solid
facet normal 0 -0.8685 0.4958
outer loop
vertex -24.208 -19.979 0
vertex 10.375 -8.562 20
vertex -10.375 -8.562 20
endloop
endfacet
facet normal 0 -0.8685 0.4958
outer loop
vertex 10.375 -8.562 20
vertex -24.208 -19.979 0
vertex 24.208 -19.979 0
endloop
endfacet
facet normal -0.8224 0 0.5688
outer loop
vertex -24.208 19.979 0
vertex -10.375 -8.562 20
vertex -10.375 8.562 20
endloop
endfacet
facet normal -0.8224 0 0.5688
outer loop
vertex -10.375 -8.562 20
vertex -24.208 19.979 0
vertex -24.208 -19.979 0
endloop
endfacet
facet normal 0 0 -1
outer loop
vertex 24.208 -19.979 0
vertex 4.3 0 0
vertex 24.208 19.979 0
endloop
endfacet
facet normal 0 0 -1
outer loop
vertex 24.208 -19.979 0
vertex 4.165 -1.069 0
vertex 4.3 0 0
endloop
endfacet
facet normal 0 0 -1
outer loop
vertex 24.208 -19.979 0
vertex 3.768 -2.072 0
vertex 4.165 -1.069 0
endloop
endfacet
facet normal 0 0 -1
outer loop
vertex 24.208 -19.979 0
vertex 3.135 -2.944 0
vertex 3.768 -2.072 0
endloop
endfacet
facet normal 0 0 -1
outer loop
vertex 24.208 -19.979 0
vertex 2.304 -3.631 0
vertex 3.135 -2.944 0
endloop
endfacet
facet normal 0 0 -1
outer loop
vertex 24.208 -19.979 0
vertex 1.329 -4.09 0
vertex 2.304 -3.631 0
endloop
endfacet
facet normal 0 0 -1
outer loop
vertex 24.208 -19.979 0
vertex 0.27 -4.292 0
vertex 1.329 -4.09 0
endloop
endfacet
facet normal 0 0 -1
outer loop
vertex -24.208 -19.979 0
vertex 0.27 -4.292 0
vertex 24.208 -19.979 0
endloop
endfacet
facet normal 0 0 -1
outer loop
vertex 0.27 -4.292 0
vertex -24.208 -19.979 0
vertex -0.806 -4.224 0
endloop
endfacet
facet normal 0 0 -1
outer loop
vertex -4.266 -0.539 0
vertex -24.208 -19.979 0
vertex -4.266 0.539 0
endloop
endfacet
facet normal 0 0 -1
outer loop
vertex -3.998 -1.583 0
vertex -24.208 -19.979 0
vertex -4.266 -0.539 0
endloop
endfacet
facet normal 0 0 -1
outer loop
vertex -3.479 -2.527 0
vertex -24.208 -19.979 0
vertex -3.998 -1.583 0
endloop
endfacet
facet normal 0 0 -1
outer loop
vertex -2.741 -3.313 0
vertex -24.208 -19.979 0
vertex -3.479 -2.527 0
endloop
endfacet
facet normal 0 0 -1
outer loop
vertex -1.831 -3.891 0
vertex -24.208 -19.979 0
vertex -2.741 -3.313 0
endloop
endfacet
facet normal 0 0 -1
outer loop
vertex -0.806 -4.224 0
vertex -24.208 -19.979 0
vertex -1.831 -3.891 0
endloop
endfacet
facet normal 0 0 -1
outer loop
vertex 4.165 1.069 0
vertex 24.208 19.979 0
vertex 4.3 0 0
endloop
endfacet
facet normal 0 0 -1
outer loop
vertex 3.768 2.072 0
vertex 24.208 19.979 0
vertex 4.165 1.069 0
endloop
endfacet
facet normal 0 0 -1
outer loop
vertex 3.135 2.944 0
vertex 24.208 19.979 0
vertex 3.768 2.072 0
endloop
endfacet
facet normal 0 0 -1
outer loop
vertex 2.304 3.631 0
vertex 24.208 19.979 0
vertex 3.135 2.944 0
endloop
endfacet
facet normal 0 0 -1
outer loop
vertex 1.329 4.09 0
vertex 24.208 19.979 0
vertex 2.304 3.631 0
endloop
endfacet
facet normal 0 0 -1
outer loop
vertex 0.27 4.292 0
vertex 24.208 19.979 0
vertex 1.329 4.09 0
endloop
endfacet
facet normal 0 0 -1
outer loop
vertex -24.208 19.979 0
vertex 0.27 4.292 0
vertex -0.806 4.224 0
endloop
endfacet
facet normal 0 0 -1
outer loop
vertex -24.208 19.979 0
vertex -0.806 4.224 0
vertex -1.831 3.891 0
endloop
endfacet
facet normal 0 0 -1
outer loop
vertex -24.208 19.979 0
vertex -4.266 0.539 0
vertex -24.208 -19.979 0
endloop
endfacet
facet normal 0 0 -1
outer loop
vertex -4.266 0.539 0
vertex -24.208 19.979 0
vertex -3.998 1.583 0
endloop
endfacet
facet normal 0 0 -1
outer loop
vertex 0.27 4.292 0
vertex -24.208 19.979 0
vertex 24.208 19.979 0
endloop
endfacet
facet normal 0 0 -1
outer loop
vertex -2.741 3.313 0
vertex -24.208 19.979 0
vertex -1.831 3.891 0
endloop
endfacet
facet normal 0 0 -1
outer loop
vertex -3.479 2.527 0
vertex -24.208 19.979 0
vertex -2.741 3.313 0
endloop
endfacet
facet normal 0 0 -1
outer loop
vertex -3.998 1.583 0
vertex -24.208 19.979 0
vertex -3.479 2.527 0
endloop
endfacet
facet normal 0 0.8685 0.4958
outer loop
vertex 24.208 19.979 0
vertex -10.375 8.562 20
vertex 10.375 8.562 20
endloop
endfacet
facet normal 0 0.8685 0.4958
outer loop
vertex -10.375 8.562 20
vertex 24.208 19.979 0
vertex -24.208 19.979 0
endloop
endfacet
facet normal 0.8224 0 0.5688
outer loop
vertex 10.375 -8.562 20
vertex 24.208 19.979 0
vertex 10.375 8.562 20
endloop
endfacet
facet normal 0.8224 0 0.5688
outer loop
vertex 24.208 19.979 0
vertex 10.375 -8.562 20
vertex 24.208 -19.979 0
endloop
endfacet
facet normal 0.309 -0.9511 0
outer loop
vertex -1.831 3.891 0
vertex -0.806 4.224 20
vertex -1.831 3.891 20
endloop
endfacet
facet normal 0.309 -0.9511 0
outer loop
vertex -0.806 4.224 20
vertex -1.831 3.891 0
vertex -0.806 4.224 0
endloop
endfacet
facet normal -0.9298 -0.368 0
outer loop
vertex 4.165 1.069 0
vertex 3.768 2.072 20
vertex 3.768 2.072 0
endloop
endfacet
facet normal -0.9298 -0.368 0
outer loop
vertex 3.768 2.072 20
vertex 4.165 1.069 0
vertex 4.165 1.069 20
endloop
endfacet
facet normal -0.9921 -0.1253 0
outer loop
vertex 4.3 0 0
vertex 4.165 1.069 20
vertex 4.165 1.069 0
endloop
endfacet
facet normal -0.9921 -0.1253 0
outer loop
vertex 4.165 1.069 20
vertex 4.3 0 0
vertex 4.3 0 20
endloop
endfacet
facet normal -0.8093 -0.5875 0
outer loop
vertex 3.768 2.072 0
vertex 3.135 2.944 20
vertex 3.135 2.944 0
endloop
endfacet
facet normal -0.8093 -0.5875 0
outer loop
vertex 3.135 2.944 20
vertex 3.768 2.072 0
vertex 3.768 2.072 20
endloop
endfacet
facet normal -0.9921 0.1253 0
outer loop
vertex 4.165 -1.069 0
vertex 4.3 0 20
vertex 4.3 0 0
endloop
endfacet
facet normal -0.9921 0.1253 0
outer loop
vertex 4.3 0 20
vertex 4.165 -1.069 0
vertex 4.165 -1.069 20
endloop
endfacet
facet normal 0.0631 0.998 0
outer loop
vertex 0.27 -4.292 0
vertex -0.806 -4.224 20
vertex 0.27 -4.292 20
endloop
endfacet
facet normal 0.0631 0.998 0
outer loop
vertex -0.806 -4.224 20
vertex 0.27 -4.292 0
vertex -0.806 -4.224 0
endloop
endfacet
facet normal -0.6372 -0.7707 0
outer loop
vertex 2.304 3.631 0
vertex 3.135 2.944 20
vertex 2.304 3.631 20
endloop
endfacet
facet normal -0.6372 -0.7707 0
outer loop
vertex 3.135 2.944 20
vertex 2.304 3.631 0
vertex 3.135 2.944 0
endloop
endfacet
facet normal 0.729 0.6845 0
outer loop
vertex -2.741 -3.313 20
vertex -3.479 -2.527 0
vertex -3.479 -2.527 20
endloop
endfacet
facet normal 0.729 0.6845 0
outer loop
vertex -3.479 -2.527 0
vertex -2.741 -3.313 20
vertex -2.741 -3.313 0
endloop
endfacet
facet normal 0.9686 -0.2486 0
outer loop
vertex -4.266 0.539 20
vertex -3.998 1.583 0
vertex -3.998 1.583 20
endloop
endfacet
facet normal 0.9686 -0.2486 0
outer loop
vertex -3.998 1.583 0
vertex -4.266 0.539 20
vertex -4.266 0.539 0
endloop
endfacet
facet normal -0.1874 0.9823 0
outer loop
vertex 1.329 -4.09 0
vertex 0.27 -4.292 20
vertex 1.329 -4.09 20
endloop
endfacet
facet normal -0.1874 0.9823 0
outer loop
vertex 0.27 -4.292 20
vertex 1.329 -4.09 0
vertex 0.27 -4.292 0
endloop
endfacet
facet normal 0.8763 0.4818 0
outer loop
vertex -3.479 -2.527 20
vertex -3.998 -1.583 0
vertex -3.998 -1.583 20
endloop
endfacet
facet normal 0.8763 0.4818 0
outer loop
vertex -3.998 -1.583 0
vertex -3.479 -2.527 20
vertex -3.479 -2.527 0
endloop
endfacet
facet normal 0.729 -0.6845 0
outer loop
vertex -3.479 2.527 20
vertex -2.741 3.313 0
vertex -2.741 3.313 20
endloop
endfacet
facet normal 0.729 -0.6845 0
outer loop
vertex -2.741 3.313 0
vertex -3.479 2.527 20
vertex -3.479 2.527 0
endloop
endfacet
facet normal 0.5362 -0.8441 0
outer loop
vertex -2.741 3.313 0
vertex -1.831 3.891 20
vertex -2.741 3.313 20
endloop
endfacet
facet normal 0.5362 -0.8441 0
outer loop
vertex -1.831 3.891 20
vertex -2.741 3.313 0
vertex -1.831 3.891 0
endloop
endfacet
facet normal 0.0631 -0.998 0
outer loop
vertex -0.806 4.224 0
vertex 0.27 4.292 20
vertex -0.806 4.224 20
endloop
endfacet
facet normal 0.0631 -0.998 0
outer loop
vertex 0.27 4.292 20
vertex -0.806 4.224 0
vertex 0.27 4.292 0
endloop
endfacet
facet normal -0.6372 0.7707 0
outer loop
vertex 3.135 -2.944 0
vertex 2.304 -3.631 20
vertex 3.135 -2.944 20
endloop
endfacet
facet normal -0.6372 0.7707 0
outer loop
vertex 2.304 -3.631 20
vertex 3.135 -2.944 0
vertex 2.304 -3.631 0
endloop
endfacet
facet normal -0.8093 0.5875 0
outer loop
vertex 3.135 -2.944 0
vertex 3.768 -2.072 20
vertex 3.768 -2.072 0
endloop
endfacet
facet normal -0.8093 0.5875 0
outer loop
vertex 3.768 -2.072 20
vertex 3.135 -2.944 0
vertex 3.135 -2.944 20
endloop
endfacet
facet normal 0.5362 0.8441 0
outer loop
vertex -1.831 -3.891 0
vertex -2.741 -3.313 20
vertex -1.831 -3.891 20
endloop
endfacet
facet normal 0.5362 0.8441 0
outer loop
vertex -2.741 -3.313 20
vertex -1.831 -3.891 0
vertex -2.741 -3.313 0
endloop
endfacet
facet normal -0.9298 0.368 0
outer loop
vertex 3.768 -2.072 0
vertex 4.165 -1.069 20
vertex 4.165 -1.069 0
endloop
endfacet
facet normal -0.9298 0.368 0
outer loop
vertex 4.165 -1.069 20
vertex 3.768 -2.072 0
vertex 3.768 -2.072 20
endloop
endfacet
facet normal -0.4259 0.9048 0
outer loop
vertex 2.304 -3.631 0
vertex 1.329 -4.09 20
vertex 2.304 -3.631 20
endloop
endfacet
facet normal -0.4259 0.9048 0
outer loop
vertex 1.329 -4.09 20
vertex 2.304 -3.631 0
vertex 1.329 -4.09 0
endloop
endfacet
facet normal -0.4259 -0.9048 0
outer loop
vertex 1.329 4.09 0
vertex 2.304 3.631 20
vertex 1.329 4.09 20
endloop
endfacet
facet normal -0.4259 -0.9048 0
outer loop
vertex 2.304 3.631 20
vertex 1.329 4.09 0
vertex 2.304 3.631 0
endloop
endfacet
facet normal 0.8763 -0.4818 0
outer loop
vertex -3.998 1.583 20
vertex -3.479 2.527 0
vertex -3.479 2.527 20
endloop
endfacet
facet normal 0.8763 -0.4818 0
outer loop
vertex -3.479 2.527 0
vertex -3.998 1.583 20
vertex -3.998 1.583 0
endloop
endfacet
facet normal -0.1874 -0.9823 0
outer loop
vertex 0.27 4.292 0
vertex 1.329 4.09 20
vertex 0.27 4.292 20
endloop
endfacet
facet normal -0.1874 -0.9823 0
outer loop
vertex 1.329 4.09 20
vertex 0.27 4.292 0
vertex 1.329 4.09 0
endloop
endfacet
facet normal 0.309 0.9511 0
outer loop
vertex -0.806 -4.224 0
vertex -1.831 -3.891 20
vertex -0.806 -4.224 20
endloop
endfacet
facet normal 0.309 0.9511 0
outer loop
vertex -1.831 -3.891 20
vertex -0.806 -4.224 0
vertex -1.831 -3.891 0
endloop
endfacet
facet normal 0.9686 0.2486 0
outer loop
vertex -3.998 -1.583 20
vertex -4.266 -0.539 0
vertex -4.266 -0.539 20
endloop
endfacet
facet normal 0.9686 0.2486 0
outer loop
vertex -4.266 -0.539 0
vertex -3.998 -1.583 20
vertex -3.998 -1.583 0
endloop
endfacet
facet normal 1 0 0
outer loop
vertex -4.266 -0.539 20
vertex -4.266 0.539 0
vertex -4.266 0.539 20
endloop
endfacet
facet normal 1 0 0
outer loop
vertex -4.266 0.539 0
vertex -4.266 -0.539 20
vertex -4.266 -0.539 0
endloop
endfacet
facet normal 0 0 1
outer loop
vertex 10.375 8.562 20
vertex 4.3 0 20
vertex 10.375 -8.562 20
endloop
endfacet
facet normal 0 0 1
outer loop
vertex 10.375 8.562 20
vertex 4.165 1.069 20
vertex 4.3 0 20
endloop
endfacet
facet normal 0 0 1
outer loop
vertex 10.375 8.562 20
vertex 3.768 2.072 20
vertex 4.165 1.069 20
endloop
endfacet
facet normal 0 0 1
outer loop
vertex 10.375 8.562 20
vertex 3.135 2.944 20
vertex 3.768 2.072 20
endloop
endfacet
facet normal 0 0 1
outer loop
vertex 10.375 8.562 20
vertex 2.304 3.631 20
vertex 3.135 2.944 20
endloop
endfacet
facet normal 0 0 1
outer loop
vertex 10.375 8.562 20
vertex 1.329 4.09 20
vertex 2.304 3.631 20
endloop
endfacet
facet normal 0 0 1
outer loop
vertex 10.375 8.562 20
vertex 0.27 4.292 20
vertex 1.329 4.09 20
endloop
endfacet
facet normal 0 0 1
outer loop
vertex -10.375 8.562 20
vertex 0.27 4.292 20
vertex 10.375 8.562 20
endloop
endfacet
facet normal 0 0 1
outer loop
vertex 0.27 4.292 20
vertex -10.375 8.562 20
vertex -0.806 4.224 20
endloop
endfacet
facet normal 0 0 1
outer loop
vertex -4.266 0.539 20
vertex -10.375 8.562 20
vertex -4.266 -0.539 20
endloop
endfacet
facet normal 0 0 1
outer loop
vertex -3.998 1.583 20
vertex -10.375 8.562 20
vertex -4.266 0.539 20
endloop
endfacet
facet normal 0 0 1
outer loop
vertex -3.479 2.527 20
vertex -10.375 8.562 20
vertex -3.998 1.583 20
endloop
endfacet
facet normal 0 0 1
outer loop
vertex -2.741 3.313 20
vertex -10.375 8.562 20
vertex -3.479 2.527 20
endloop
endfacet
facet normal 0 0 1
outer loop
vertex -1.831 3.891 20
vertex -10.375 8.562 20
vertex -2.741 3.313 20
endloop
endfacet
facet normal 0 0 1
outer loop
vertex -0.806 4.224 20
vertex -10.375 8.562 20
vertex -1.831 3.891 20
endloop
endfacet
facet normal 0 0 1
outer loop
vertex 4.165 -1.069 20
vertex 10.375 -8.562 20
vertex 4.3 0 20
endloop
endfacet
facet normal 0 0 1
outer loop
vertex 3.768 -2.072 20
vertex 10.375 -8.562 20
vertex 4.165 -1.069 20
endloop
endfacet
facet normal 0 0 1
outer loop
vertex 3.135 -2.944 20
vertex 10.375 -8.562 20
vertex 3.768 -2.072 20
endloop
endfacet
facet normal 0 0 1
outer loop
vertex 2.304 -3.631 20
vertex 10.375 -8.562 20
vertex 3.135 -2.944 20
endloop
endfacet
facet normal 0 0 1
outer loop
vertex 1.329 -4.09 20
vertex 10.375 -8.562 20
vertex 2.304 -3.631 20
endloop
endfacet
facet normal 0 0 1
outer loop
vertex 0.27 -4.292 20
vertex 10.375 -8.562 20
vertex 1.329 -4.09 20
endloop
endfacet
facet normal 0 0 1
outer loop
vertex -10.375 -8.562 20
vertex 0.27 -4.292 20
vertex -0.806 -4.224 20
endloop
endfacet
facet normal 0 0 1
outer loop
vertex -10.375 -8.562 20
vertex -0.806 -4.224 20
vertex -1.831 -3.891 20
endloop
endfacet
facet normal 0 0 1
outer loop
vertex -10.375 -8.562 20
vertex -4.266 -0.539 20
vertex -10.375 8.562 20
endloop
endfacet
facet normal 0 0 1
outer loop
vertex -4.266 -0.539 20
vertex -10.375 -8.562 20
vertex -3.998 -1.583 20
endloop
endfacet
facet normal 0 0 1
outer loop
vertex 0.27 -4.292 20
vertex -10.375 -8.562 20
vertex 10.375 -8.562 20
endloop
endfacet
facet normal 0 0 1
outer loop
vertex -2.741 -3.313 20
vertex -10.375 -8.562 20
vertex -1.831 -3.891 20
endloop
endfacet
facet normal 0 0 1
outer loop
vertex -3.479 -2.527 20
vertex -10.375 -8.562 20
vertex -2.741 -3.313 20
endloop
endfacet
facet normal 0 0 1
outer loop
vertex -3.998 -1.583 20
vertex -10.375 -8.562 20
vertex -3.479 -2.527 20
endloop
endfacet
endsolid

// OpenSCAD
$fn = 25;

d_1 = 8.0; // axis diameter

r_1 = d_1 / 2 + 0.3;

l_0 = 30.0;
l_a =  5.0;
l_b = 10.0;
l_tot = l_0 + l_a;
z_all = l_a + l_b;

x_1 = 41.5;
y_1 = 27.0;
d_l = ( 75.0 - 62.3 ) / 2;
x_0 = x_1 * ( l_tot ) / l_0;
y_0 = y_1 * ( l_tot ) / ( l_0 - d_l );
echo( x_0, " ", y_0 );


difference() {
  linear_extrude( height=l_tot,  scale=0.0 )
    translate([-x_0/2,-y_0/2]) square( [x_0,y_0]);
  cylinder( r=r_1, h=l_tot );
  translate([-30,-30,20]) cube([60,60,60]);
}
